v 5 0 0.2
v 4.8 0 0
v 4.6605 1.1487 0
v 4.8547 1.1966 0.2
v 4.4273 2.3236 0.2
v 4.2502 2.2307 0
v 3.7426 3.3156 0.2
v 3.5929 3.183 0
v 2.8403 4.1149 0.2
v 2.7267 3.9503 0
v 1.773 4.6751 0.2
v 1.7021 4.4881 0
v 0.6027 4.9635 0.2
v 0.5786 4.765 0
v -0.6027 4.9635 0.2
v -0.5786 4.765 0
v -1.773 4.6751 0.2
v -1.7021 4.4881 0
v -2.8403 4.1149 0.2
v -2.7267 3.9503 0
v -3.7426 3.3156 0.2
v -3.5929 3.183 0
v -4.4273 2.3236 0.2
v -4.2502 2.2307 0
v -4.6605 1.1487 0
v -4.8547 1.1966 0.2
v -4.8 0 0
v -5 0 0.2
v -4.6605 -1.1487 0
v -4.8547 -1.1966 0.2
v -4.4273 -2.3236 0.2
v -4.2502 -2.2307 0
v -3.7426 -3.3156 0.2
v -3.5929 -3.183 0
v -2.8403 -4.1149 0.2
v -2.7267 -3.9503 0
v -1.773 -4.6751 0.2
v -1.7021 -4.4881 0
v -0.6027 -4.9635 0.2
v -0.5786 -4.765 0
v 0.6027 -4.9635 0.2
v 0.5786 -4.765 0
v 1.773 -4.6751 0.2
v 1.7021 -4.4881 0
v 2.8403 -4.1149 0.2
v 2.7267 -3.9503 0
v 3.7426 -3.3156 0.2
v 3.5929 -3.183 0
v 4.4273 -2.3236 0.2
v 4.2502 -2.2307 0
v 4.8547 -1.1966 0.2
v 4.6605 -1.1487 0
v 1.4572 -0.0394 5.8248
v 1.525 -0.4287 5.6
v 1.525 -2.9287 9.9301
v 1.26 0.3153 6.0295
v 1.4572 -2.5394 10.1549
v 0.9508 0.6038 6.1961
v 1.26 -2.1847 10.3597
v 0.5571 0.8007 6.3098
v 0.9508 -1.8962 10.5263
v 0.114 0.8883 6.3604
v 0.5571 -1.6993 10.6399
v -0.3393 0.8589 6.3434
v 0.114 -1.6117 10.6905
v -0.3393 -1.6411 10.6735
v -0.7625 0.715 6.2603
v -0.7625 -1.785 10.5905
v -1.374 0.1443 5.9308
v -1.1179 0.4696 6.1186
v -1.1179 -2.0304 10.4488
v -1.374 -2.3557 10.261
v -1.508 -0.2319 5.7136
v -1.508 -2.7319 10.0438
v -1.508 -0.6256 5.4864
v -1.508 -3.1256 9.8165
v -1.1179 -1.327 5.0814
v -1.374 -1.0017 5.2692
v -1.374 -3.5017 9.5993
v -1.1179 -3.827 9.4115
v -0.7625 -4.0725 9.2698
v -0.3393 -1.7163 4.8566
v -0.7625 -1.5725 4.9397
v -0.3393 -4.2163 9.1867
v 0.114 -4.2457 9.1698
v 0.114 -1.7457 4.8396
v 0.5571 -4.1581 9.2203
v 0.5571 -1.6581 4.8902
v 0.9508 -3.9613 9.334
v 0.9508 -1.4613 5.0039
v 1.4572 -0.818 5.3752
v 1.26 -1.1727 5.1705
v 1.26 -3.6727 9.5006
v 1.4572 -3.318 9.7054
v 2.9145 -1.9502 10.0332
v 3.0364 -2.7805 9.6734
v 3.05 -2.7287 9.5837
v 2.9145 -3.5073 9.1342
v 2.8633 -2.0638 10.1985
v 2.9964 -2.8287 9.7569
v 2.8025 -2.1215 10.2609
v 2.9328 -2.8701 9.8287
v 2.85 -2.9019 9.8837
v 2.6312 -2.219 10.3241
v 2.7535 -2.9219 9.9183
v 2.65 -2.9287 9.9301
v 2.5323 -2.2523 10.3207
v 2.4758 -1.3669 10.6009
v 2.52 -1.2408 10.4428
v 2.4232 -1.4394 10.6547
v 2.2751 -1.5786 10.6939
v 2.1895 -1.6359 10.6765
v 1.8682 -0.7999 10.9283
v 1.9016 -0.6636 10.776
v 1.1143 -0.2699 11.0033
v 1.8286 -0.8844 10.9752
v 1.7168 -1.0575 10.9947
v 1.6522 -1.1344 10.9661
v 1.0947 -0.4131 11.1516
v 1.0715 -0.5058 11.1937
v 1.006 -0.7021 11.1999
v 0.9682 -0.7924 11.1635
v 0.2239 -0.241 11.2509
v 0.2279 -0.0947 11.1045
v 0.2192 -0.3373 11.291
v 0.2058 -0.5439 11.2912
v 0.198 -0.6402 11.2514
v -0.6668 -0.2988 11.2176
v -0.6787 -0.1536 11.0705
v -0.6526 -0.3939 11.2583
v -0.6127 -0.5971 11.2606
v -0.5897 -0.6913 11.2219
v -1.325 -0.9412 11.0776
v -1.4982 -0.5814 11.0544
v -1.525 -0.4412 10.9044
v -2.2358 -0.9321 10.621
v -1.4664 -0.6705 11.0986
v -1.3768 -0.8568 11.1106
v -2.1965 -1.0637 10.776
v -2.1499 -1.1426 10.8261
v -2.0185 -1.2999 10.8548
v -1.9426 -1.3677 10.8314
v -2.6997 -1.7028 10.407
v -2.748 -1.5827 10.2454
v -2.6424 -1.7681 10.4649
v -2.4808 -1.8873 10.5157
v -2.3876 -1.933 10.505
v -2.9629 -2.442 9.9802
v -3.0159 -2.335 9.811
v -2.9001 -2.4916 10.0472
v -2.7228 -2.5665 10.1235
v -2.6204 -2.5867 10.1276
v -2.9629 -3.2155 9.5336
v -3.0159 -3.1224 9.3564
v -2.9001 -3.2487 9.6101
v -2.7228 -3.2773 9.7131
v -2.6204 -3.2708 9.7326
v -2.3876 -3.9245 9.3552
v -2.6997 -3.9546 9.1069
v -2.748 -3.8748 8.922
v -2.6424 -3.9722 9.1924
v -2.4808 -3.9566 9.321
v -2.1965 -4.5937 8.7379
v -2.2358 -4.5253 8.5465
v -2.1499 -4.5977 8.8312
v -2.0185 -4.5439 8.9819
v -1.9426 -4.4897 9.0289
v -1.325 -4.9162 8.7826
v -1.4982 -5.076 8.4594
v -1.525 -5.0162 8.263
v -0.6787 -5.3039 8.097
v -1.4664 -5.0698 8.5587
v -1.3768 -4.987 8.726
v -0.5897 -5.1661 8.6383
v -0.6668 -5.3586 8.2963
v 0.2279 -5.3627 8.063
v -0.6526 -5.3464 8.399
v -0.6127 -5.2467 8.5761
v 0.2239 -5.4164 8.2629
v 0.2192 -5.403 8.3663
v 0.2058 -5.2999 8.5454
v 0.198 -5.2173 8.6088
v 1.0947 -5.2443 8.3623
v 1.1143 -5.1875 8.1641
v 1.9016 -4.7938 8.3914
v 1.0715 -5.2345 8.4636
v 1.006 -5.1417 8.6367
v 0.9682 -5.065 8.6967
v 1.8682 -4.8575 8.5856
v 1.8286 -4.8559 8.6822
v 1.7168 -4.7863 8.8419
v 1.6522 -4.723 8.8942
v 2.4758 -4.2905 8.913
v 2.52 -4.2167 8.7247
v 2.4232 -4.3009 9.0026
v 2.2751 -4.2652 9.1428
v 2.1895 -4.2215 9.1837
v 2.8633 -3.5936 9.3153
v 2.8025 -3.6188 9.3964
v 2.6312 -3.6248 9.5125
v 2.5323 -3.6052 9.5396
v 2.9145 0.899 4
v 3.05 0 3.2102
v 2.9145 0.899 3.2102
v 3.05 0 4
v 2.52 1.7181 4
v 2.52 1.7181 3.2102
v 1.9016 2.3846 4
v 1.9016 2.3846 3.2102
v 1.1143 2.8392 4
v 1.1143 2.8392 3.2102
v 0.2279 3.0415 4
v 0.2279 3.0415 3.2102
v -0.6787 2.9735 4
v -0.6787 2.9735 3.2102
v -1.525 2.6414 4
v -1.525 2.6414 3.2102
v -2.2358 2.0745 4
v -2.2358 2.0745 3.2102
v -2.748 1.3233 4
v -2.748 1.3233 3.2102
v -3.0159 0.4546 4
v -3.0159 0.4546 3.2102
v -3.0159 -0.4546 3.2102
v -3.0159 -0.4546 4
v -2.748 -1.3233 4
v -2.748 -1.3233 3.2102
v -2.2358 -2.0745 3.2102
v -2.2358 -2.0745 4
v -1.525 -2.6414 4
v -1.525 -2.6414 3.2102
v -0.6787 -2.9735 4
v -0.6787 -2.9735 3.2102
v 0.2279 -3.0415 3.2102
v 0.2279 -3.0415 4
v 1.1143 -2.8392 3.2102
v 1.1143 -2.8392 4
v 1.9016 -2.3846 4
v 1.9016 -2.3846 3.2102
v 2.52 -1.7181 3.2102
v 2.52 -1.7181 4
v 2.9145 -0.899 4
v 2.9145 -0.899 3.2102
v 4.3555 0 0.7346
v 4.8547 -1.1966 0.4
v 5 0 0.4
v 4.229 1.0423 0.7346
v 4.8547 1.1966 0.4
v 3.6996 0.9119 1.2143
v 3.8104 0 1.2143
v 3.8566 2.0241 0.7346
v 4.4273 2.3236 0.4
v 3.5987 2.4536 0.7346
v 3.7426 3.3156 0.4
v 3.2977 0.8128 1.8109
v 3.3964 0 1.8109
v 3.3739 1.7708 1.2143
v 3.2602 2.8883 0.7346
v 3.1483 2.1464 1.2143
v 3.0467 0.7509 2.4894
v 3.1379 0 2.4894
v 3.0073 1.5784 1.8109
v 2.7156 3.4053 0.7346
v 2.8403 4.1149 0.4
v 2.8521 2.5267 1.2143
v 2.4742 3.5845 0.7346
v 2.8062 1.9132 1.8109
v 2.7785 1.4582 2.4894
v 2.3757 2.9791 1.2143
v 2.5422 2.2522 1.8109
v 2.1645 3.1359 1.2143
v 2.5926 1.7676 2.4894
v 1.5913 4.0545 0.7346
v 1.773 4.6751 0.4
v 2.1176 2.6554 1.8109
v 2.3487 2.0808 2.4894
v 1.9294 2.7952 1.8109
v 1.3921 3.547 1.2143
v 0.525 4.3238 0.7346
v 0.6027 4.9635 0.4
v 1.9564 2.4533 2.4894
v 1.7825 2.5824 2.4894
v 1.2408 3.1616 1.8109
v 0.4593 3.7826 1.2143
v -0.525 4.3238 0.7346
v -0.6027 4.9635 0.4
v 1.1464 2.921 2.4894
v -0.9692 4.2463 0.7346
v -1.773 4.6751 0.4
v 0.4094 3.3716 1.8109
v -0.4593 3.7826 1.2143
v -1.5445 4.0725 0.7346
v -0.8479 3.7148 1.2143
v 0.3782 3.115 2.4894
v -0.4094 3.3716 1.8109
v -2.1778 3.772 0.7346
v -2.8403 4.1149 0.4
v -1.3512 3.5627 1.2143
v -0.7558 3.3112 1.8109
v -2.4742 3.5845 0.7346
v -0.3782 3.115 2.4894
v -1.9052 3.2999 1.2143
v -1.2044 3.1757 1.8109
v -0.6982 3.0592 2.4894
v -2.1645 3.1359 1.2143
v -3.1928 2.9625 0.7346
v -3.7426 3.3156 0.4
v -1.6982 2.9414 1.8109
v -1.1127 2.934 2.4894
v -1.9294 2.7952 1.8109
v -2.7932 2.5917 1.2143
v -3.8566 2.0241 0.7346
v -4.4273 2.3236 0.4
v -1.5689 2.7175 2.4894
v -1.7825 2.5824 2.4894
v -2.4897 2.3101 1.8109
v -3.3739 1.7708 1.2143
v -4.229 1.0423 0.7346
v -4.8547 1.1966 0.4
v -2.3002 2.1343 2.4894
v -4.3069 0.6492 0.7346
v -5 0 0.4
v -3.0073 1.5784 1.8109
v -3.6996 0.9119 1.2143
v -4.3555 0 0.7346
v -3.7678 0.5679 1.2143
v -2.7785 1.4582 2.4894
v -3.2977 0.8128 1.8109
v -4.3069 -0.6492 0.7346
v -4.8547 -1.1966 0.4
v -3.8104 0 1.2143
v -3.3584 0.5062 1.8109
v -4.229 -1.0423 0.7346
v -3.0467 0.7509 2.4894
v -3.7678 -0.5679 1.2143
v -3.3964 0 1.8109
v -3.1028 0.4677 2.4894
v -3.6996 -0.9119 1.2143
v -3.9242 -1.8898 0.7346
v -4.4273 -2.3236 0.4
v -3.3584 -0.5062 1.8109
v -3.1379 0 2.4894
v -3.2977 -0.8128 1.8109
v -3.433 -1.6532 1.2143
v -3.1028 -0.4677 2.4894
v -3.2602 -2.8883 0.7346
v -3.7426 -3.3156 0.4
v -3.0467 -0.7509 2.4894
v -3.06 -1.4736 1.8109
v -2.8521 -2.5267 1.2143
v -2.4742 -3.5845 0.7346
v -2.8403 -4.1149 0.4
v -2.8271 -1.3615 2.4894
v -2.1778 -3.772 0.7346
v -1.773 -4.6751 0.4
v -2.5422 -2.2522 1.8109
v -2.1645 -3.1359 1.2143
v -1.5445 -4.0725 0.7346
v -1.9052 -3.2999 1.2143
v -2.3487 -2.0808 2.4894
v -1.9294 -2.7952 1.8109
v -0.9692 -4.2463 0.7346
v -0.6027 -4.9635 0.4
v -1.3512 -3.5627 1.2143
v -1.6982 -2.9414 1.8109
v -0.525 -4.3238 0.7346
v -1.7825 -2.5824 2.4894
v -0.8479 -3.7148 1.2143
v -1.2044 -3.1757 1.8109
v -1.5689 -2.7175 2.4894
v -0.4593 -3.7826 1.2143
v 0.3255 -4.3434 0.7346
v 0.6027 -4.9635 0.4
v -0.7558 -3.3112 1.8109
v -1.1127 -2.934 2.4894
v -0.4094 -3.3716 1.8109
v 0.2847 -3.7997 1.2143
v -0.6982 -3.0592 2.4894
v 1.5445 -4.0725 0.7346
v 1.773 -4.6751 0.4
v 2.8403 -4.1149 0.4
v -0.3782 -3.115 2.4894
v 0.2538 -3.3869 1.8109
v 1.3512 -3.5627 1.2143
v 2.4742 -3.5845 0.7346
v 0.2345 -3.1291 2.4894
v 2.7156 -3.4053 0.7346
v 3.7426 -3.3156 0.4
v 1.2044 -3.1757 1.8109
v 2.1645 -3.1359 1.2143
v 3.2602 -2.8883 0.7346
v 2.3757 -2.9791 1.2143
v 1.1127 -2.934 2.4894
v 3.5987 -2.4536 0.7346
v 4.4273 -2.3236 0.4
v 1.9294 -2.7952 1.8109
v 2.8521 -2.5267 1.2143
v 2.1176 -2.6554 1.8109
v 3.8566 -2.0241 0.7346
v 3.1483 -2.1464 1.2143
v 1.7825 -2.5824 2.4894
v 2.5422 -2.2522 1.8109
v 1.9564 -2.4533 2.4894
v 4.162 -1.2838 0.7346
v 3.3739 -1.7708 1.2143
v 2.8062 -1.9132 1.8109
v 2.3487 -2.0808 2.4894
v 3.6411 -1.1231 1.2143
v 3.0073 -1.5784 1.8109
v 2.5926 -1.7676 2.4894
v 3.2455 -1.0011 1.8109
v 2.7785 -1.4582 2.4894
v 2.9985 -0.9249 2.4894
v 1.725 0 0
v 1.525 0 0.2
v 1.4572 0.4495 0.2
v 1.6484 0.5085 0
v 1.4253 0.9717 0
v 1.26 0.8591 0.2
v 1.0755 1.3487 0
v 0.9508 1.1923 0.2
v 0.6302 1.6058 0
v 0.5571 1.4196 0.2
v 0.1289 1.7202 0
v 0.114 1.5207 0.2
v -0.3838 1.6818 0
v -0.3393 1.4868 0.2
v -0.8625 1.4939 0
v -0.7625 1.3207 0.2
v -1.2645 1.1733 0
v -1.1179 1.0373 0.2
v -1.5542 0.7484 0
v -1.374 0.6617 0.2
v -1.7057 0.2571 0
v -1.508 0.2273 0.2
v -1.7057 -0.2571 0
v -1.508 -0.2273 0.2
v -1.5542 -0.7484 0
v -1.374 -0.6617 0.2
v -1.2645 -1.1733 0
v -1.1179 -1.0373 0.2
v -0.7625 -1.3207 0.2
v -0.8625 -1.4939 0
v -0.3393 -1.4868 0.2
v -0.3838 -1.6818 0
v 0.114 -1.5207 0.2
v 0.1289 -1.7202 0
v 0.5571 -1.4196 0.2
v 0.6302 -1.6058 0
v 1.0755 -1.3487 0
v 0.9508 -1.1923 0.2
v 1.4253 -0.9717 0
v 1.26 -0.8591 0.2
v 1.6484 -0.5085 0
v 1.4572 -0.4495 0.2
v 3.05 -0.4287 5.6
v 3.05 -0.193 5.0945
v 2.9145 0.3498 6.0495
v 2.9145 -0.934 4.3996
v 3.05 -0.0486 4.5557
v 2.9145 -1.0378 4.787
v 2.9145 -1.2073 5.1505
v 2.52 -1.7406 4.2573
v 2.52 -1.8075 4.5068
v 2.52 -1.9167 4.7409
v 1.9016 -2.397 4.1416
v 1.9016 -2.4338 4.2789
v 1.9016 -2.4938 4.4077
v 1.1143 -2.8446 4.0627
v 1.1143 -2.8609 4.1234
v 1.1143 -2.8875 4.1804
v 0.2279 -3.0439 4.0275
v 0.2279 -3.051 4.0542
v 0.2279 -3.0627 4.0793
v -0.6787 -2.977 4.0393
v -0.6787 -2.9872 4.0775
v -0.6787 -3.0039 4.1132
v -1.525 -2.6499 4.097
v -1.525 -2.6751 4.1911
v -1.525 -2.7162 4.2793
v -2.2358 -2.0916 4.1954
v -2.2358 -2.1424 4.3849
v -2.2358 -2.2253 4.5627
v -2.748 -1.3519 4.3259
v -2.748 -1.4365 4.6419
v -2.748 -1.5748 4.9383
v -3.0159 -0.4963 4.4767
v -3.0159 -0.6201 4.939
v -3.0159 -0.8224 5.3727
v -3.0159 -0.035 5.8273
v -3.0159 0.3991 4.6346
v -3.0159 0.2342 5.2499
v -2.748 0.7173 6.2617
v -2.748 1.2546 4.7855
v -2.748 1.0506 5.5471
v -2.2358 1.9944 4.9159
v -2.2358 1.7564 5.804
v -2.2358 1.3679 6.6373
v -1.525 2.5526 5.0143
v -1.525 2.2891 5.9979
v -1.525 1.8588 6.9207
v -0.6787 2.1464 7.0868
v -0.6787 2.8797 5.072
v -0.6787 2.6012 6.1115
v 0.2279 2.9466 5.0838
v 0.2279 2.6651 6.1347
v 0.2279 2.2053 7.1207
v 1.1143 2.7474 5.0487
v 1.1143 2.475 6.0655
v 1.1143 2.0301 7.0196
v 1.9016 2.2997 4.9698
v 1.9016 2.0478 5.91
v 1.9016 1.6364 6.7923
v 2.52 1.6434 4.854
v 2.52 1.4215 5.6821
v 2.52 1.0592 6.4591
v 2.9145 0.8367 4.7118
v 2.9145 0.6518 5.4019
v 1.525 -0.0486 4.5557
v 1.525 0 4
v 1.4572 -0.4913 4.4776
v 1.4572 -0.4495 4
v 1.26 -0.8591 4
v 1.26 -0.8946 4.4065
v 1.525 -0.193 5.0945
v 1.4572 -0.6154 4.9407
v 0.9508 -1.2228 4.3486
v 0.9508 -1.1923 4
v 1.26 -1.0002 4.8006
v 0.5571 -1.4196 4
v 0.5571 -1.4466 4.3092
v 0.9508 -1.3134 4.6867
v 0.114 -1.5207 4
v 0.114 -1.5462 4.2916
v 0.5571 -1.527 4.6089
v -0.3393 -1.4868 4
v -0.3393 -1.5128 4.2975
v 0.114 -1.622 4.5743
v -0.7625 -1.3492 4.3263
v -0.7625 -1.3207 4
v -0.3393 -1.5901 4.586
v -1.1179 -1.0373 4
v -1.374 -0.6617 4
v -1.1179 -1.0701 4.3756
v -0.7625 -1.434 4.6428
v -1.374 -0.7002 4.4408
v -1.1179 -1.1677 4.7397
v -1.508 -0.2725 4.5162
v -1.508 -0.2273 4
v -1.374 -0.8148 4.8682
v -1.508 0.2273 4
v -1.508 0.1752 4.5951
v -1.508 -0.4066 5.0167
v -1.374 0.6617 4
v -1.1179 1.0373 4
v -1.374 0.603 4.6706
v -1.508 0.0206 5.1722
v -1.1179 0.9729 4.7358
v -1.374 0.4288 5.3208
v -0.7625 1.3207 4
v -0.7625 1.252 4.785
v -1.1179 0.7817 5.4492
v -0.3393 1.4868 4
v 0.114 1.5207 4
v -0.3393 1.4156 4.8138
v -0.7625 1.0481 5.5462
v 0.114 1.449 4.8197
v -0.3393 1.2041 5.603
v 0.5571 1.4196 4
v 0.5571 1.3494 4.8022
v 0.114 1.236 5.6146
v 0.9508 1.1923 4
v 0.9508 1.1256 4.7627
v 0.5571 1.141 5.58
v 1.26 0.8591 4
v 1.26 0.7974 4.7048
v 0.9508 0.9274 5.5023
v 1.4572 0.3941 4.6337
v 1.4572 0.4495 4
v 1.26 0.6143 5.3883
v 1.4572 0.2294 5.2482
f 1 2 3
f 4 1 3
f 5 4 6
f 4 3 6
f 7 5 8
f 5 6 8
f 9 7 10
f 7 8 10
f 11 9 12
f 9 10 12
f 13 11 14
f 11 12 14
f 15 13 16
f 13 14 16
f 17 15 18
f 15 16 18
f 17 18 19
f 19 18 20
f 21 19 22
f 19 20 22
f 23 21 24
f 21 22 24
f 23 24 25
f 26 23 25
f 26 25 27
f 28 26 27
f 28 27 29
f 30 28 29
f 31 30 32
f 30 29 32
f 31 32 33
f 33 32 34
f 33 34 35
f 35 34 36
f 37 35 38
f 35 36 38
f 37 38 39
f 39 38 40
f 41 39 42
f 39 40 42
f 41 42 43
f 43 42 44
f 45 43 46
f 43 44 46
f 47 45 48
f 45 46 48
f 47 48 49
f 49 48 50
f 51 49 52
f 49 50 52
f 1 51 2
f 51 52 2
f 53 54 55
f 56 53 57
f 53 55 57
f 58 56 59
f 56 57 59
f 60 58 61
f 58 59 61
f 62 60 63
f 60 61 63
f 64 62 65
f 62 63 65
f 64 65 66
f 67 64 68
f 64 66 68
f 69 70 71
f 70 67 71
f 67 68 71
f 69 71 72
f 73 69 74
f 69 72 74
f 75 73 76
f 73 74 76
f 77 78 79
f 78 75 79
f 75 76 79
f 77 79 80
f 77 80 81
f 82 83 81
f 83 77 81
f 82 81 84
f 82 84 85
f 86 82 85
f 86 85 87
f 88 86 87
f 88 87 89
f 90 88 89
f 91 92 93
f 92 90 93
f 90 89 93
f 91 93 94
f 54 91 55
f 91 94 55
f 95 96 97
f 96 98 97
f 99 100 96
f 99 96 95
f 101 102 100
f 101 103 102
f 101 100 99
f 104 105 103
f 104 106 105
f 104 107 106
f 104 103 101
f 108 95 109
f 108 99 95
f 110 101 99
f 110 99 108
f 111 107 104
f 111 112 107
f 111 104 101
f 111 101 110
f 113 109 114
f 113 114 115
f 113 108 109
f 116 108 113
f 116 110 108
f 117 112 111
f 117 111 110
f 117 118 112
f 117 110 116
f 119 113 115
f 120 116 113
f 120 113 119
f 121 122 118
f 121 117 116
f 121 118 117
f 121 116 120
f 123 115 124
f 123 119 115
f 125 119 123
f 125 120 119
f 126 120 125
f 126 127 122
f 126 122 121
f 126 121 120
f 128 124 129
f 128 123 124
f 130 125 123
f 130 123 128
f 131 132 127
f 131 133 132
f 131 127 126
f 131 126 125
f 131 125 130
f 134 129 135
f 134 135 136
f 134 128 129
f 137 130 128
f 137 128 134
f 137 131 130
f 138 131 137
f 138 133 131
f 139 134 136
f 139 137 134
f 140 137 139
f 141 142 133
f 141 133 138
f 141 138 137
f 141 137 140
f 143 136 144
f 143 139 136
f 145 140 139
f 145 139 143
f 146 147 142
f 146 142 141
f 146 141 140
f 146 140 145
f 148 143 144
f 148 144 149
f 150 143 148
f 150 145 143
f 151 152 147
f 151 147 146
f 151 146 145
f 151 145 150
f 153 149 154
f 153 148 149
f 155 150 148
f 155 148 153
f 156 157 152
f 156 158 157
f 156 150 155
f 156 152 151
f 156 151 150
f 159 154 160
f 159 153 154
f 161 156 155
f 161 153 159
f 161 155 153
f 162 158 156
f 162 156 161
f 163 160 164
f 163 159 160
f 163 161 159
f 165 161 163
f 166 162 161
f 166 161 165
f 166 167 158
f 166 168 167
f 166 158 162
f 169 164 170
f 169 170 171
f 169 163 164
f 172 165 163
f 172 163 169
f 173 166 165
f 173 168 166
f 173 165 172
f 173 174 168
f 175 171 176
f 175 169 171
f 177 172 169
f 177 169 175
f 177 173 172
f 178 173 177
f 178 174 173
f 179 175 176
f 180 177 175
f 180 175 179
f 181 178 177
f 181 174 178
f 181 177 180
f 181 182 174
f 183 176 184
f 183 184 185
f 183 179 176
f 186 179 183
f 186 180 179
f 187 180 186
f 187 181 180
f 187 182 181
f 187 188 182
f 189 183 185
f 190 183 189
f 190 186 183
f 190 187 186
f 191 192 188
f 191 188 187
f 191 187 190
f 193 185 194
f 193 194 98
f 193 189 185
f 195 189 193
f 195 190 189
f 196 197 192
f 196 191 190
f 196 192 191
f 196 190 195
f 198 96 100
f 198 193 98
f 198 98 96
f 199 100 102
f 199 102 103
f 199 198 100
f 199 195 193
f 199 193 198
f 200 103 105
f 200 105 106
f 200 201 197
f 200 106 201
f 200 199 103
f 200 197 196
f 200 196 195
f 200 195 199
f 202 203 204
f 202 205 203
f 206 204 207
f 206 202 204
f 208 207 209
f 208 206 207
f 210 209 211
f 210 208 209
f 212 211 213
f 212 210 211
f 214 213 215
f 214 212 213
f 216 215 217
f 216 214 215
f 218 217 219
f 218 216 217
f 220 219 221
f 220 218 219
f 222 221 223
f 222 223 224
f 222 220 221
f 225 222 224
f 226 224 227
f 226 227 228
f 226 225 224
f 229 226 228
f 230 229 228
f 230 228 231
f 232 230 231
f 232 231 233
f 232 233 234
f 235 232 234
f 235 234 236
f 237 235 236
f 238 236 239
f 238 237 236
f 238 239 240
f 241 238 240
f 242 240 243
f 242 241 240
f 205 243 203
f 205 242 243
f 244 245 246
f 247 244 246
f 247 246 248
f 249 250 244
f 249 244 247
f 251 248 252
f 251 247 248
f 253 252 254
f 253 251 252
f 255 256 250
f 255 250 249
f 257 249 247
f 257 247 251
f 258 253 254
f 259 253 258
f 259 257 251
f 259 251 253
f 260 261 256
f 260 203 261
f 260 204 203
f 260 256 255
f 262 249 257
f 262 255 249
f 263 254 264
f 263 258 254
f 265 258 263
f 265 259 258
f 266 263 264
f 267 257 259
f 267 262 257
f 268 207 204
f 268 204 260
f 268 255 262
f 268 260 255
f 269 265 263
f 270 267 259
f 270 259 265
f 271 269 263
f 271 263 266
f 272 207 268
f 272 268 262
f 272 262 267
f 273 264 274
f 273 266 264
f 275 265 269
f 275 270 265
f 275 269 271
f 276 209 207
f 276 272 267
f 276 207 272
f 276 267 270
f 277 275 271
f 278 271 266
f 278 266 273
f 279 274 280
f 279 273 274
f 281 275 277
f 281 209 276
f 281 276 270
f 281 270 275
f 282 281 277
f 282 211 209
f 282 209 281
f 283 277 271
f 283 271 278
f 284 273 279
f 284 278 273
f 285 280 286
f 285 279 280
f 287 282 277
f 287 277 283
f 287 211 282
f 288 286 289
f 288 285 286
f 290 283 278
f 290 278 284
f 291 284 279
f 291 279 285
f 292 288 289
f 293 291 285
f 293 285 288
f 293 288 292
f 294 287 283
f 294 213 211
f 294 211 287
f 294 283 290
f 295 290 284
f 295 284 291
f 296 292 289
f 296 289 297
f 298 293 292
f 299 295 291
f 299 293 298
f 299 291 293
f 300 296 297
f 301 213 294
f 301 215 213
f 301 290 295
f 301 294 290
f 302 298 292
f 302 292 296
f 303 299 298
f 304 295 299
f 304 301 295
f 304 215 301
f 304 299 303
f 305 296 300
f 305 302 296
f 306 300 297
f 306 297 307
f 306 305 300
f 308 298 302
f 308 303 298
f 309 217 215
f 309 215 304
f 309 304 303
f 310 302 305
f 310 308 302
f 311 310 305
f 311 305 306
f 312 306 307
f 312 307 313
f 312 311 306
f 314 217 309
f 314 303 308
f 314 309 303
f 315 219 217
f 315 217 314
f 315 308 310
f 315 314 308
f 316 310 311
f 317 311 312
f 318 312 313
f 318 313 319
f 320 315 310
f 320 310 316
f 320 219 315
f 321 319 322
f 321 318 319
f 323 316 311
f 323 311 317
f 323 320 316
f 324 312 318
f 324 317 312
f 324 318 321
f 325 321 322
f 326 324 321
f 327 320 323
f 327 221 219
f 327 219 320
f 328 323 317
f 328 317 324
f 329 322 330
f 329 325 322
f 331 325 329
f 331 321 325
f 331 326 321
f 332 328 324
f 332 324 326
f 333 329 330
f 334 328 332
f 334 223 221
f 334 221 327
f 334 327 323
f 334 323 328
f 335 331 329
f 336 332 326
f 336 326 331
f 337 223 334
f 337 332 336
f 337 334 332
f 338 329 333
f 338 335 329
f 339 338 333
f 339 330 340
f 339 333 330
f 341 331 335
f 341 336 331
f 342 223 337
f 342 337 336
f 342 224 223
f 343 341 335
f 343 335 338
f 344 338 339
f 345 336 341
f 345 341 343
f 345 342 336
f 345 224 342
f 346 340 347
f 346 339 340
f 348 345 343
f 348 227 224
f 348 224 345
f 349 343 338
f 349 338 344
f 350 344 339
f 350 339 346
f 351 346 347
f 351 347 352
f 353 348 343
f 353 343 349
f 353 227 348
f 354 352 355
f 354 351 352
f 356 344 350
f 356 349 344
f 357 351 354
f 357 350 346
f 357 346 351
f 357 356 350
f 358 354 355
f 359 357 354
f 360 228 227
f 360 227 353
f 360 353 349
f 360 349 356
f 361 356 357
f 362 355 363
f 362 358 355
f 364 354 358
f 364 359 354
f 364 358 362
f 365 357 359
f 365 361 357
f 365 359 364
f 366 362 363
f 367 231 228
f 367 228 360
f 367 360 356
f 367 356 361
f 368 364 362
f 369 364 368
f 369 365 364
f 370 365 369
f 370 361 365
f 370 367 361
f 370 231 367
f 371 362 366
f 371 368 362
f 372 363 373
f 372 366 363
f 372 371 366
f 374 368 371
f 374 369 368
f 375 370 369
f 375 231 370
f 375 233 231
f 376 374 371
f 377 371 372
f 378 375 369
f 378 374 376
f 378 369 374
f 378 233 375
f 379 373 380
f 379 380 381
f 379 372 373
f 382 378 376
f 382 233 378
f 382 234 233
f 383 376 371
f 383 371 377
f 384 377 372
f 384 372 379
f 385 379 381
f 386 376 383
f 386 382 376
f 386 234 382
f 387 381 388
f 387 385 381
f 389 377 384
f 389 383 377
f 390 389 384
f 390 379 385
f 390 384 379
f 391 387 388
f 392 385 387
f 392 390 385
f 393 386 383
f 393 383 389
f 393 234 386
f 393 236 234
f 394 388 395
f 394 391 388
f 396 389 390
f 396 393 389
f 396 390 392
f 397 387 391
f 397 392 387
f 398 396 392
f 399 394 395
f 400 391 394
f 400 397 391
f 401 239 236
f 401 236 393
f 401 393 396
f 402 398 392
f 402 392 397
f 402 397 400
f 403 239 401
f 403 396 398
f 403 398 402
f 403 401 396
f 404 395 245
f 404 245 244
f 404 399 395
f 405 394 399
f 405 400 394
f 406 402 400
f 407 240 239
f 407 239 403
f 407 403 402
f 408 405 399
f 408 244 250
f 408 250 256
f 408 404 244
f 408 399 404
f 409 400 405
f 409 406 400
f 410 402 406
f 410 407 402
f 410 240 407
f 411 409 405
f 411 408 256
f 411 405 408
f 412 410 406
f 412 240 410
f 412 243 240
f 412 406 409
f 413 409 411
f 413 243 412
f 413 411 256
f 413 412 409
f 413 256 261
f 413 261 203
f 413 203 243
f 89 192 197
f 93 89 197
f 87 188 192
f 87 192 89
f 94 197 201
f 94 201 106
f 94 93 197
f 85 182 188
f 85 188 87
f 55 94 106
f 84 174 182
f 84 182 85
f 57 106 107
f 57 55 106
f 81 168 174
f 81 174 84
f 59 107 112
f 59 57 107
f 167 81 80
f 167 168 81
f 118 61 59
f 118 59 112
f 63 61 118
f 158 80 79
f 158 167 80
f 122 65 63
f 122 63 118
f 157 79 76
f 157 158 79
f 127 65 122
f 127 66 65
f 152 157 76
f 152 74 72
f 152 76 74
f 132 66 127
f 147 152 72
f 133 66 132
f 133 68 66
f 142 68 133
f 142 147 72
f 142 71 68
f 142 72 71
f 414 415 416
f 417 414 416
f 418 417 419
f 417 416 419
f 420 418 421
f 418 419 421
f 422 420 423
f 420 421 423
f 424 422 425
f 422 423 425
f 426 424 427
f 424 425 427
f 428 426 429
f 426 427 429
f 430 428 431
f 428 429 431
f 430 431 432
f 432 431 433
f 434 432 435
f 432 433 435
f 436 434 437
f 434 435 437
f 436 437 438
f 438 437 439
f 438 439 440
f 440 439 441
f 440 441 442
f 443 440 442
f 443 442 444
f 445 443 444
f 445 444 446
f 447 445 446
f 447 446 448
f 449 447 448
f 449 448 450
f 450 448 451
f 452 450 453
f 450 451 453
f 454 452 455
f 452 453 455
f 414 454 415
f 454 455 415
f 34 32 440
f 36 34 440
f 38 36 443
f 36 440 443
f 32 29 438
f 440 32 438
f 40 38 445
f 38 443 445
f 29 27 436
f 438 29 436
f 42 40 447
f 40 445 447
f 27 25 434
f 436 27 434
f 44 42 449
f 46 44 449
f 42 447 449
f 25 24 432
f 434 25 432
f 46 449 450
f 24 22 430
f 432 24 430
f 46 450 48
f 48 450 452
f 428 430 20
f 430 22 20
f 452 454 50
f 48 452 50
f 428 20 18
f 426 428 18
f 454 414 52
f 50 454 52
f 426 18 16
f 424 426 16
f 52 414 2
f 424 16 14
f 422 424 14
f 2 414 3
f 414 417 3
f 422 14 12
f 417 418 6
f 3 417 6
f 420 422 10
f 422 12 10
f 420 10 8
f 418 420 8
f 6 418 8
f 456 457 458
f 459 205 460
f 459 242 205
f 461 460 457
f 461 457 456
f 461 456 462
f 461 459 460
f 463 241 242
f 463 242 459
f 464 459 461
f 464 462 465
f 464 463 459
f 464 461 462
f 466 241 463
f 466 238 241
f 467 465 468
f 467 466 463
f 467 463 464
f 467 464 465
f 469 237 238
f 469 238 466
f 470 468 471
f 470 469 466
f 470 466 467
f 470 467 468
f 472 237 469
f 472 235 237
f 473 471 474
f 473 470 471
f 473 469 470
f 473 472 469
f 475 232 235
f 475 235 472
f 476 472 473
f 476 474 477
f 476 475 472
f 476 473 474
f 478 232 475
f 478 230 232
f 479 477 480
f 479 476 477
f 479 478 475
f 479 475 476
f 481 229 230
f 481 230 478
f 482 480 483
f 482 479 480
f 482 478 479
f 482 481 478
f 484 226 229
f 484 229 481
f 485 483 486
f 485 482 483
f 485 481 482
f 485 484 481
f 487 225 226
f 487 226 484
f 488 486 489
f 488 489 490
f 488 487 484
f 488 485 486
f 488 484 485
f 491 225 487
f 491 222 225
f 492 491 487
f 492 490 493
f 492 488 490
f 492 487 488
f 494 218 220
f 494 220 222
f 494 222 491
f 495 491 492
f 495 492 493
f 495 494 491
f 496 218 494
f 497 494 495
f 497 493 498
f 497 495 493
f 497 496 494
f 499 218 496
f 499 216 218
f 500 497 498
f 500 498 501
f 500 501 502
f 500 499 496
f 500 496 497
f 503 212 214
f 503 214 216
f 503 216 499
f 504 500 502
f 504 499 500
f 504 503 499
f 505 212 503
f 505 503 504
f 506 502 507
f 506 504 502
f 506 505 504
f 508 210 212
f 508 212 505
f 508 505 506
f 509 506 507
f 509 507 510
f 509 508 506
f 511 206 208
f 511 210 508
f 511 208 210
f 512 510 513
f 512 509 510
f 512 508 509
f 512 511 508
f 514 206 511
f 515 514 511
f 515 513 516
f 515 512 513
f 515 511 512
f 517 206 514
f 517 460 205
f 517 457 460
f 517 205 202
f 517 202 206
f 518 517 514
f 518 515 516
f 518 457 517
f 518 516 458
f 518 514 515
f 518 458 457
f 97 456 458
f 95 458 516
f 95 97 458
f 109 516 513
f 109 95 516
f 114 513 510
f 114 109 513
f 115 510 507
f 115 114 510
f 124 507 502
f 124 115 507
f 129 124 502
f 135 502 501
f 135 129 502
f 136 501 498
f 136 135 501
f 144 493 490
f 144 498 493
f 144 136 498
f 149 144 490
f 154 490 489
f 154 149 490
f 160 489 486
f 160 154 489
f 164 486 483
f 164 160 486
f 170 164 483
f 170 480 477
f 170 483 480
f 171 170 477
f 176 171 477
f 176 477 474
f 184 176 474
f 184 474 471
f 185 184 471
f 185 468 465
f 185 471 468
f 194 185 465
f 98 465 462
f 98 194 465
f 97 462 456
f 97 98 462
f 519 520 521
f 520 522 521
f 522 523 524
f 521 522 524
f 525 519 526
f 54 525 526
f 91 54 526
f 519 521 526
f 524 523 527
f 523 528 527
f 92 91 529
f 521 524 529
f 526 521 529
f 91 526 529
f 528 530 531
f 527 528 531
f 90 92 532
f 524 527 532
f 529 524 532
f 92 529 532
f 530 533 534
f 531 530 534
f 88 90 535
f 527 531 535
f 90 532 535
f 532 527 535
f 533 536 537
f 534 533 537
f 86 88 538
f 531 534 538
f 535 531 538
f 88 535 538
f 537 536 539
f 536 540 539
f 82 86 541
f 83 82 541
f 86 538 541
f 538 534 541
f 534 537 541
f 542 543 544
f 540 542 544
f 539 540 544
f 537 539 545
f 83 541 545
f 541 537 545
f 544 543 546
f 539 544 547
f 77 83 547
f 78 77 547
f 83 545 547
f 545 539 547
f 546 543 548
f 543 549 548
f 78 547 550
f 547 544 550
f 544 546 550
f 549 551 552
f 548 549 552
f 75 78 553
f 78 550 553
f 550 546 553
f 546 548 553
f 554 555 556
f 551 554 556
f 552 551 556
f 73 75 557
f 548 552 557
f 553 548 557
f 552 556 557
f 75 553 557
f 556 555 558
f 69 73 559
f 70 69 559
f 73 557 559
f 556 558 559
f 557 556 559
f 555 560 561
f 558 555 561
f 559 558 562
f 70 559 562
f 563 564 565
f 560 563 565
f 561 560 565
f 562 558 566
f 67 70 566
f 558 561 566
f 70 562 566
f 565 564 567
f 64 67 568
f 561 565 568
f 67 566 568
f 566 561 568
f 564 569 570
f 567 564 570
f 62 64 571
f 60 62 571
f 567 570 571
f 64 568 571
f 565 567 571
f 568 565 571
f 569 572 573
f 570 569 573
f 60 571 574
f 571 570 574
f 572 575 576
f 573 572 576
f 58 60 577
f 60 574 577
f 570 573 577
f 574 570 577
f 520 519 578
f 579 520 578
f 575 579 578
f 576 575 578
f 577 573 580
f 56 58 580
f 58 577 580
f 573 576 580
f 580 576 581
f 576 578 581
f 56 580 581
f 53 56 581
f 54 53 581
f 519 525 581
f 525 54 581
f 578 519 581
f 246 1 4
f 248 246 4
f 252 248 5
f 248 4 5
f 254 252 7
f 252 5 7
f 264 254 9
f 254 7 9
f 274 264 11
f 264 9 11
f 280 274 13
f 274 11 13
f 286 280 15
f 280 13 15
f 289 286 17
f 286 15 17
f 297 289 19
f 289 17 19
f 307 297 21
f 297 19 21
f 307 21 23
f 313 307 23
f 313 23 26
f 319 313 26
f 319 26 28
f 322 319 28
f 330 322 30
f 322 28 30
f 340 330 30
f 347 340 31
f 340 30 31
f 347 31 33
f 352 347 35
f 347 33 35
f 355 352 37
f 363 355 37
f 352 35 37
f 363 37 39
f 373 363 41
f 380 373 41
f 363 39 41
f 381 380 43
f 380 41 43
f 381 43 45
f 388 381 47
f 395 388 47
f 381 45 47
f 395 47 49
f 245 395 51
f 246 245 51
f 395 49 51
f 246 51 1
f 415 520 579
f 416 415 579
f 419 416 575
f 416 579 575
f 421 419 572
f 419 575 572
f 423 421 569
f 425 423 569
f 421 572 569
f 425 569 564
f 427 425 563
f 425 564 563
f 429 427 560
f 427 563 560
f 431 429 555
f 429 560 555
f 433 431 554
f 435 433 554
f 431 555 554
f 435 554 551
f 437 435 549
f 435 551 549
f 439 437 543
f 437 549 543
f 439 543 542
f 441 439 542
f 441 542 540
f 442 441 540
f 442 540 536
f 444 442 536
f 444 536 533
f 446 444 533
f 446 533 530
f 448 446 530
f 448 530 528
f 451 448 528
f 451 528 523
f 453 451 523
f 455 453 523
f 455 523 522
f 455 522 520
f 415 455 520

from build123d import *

# Parameters (mm, degrees)
F0_R     = 5
F0_R_2   = 3
F1_DEPTH = 0.4
F3_R     = 3.05
F3_R_2   = 1.525
F6_SIZE  = 0.2
F7_R     = 0.4


# Not quite as in the source:
# - a fillet or chamfer that OpenCascade refuses, or shapes differently, is made with other operations: its cross-section is extruded or revolved along the edge and cut away or added


with BuildPart() as f1:
    # F0 (on Top) → F1 (new body)
    with BuildSketch(Plane.XY):
        Circle(F0_R)
        Circle(F0_R_2, mode=Mode.SUBTRACT)
    extrude(amount=F1_DEPTH)

    # F4: sweep along a path in F2
    with BuildLine(Plane.YZ) as f4_path:
        Line((0, 0), (0, 4))
        ThreePointArc((0, 4), (-0.1090373559, 4.8282209443), (-0.4287187079, 5.6))
        Line((-0.4287187079, 5.6), (-2.9287187079, 9.9301270189))
    # F3 (on Top) → F4 (sweep)
    with BuildSketch(Plane.XY):
        Circle(F3_R)
        Circle(F3_R_2, mode=Mode.SUBTRACT)
    sweep(path=f4_path.line)

    # F5: fillet of radius 3 on 1 edges, made by hand

    # F5_s1 → F5_t2 (revolve)
    with BuildSketch(Plane.XZ):
        with BuildLine():
            ThreePointArc((5, 0.4), (3.5852484912, 1.4999859616), (3.05, 3.2102490993))
            Line((3.05, 3.2102490993), (3.05, 0.4))
            Line((3.05, 0.4), (5, 0.4))
        make_face()
    revolve(axis=Axis((0, 0, 0.4), (0, 0, 1)))

    # F6
    f6_edges = [f1.edges().sort_by_distance(p)[0] for p in [
        (-5, 0, 0),
        (-1.525, 0, 0),
    ]]
    chamfer(f6_edges, length=F6_SIZE)

    # F7
    f7_edges = [f1.edges().sort_by_distance(p)[0] for p in [
        (-3.05, -2.928719, 9.930127),
    ]]
    fillet(f7_edges, radius=F7_R)


solid = f1.part
